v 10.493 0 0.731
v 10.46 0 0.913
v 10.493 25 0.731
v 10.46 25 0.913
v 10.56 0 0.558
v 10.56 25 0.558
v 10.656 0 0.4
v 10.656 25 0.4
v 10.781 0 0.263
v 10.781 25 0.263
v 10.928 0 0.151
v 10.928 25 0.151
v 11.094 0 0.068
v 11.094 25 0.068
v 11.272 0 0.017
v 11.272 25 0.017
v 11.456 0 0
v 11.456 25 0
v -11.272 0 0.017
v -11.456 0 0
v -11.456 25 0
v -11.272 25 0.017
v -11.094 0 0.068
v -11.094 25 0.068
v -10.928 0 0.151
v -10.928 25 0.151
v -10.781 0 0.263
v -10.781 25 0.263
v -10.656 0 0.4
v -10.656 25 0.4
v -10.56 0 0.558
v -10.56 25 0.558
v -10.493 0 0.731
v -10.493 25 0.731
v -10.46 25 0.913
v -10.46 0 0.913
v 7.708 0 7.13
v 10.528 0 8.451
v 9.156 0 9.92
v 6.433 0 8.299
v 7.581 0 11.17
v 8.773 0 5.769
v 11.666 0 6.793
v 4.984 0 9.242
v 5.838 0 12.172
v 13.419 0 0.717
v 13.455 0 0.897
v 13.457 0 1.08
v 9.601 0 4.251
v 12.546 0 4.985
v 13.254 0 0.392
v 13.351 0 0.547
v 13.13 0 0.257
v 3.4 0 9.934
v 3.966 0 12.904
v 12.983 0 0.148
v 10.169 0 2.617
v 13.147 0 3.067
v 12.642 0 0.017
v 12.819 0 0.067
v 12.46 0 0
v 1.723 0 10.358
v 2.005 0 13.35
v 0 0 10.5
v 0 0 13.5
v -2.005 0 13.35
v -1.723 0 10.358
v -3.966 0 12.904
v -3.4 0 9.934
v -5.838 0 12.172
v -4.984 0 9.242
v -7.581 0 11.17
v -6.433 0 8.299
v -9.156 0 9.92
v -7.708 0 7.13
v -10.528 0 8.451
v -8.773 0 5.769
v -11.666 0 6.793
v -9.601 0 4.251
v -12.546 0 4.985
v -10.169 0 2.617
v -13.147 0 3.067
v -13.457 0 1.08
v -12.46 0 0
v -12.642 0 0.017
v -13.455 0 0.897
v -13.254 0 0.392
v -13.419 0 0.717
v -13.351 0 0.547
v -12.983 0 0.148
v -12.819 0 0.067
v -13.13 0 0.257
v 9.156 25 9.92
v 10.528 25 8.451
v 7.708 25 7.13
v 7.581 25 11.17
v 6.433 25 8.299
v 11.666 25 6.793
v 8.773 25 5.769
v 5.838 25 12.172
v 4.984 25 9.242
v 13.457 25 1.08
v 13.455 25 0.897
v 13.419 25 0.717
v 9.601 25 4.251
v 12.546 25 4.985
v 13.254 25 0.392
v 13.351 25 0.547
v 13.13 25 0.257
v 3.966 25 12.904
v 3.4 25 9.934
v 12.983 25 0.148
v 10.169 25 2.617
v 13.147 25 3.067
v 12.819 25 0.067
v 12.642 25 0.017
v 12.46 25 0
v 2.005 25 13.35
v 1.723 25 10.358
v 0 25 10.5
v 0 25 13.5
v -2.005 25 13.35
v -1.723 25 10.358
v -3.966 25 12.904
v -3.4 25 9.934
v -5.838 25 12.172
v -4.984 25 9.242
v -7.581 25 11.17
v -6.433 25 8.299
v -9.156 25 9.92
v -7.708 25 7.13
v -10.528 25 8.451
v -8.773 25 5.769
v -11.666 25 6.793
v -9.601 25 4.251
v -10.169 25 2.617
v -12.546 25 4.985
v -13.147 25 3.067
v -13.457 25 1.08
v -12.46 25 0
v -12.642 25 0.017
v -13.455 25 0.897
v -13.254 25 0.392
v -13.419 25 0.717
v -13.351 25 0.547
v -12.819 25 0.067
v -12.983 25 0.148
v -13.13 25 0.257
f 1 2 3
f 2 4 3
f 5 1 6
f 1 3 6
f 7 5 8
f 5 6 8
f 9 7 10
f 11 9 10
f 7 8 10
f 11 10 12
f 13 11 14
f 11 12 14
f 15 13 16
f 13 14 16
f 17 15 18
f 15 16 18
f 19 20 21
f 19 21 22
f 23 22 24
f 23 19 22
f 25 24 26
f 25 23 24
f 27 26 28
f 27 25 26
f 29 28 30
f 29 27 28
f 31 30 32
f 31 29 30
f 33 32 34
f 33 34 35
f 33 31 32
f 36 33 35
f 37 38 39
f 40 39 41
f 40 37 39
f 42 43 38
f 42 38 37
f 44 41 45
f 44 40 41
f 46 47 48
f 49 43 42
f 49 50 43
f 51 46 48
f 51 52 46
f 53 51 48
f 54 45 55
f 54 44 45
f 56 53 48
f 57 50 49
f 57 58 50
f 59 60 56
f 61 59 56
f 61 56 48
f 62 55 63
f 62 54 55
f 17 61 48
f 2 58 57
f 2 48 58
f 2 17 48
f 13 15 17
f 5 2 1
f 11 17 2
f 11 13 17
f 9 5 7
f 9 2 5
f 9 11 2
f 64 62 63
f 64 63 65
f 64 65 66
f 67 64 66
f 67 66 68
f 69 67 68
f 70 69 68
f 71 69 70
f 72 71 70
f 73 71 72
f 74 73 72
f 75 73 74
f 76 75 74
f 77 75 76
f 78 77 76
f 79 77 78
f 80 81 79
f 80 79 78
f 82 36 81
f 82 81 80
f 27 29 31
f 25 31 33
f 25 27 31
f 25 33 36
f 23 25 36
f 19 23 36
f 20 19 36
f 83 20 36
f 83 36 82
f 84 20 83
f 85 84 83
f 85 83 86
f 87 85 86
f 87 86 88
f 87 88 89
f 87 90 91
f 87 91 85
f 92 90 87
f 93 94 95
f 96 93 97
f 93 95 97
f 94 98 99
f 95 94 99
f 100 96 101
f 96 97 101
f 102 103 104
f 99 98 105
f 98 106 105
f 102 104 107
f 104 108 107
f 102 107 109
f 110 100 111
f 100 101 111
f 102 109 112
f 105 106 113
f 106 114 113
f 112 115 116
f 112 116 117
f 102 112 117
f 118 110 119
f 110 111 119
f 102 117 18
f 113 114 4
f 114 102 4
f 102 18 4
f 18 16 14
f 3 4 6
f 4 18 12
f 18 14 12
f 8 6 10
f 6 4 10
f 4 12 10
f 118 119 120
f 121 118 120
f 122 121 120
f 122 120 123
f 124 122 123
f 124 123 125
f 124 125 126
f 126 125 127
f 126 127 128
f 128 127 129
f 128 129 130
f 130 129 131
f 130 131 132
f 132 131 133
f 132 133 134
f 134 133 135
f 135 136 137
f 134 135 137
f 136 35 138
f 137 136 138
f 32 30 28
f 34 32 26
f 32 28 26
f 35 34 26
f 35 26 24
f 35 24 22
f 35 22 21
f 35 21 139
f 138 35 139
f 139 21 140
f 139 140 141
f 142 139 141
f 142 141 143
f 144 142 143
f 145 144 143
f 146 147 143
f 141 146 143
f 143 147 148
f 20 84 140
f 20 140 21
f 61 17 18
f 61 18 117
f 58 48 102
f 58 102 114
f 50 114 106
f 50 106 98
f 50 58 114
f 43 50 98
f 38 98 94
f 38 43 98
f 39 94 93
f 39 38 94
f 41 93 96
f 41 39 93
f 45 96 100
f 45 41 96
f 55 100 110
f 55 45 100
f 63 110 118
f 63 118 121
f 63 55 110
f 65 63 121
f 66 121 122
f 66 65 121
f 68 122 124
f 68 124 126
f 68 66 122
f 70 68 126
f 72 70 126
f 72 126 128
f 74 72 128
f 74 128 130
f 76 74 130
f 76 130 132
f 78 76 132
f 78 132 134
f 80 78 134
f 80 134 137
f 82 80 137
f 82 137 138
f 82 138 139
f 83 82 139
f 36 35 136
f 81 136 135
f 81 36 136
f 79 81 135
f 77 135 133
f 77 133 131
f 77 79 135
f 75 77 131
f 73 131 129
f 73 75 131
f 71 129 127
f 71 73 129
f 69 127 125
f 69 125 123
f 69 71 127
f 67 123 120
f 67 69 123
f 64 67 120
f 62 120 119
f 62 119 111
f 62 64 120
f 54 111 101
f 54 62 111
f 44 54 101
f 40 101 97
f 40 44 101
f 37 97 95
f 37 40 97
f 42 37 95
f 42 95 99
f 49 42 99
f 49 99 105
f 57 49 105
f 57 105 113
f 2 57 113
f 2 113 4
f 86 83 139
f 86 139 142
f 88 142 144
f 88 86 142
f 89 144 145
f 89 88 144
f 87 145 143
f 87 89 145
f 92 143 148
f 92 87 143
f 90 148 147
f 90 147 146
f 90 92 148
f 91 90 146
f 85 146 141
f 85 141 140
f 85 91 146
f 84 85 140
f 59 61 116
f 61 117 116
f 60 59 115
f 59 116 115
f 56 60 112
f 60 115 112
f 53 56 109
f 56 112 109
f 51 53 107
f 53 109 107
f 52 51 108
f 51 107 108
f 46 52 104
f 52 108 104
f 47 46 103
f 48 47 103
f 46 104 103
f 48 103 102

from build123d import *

# Parameters (mm, degrees)
EXTRUDE_1_DEPTH = 25
FILLET_2_R      = 1


with BuildPart() as part:
    # Эскиз1 → Бобышка-Вытянуть1 (new body)
    with BuildSketch(Plane(origin=(0, 0, 0), x_dir=(1, 0, 0), z_dir=(0, 1, 0))):
        with BuildLine():
            Line((-12.459935794, 0), (-11.456439237, 0))
            ThreePointArc((-11.456439237, 0), (-10.780775313, -0.262790219), (-10.46022713, -0.913043478))
            ThreePointArc((-10.46022713, -0.913043478), (0.456954668, -10.49005207), (10.5, 0))
            Line((10.5, 0), (13.5, 0))
            ThreePointArc((13.5, 0), (0.540433214, -13.489178327), (-13.456730658, -1.08))
            ThreePointArc((-13.456730658, -1.08), (-13.194782717, -0.321767002), (-12.459935794, 0))
        make_face()
    extrude(amount=EXTRUDE_1_DEPTH)

    # Скругление2
    fillet_2_edges = [part.edges().sort_by_distance(p)[0] for p in [
        (10.5, 12.5, 0),
        (13.5, 12.5, 0),
    ]]
    fillet(fillet_2_edges, radius=FILLET_2_R)


solid = part.part
